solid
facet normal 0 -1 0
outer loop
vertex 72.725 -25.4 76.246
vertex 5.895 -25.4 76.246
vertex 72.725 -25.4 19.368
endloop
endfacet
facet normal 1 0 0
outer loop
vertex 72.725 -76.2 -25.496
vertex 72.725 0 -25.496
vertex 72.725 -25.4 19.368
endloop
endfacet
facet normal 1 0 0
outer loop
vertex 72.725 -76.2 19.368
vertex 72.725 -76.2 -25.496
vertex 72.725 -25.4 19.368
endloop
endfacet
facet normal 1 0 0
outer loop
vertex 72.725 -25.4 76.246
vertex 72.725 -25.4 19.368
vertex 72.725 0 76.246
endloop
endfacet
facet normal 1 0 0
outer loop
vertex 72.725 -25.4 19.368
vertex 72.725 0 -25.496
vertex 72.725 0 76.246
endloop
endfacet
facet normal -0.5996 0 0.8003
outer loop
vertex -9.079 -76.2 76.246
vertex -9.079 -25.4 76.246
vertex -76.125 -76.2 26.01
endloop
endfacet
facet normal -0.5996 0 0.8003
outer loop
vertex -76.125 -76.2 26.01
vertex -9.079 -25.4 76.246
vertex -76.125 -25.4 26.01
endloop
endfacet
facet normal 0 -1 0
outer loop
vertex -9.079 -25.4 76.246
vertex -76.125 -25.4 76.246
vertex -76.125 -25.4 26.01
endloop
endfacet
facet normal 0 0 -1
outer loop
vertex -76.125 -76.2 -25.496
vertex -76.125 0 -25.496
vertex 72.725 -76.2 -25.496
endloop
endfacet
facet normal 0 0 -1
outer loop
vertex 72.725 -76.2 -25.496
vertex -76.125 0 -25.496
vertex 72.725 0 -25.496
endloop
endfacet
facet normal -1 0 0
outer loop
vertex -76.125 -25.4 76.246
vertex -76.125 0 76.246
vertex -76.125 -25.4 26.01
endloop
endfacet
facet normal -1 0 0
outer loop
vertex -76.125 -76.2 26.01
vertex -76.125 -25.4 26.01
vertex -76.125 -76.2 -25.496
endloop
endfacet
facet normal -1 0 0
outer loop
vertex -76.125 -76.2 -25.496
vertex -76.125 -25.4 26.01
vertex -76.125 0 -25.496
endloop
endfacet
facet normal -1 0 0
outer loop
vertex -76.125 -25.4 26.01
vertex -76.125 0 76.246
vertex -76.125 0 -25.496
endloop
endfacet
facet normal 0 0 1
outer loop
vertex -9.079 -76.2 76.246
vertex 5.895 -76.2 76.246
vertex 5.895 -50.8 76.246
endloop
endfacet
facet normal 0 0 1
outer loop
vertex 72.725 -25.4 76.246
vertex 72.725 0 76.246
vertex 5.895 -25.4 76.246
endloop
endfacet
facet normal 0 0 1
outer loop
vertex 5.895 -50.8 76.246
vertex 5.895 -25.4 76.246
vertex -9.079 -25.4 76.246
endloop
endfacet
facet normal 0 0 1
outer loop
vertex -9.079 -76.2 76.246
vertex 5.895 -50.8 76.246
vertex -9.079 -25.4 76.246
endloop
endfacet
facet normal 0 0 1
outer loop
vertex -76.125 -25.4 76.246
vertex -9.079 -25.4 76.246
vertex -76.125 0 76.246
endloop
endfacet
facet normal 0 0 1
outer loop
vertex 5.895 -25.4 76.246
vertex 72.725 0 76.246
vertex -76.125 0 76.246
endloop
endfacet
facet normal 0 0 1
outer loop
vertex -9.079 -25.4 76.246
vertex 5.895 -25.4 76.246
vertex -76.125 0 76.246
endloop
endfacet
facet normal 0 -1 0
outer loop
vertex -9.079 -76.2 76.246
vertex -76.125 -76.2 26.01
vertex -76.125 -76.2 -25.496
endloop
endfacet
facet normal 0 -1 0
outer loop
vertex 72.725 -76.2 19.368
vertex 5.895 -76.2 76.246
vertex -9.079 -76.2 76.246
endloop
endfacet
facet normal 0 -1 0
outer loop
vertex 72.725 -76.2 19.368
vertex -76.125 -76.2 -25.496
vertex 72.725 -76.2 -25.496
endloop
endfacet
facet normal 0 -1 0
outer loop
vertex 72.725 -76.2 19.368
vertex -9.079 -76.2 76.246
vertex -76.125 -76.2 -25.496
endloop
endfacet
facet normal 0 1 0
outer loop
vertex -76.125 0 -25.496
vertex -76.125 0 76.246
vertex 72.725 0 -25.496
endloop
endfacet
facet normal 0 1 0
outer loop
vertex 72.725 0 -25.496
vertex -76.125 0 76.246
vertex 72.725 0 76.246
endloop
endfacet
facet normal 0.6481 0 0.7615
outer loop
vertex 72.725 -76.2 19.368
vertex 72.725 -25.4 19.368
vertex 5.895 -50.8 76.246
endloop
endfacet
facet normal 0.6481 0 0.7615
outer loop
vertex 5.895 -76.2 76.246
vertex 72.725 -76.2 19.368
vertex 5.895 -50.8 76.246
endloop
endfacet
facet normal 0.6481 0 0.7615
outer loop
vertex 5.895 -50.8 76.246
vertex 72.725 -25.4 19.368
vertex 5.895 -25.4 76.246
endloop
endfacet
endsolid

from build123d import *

# Parameters (mm, degrees)
F0_W     = 148.8501727581
F0_H     = 101.742612198
F1_DEPTH = 50.8
F3_DEPTH = 25.4
F5_DEPTH = 25.4


with BuildPart() as f1:
    # F0 (on Front) → F1 (new body)
    with BuildSketch(Plane.XZ):
        with Locations((-1.6997531056, 25.3749480471)):
            Rectangle(F0_W, F0_H)
    extrude(amount=F1_DEPTH)

    # F2 (on face) → F3 (cut)
    with BuildSketch(Plane.XZ.offset(50.8)):
        Polygon((-9.0788973585, 76.2462541461), (-76.1248394847, 76.2462541461), (-76.1248394847, 26.0104050889), align=None)
        Polygon((72.7253332734, 76.2462541461), (5.8954056378, 76.2462541461), (72.7253332734, 19.3677039224), align=None)
    extrude(amount=-F3_DEPTH, mode=Mode.SUBTRACT)

    # F1_face (on face) + F4 (on face) → F5 (join)
    with BuildSketch(Plane(origin=(-1.6997531056, -50.8, 25.3749480471), x_dir=(1, 0, 0), z_dir=(0, -1, 0))):
        Polygon((74.4250863791, -6.0072441247), (7.5951587435, 50.871306099), (-7.3791442529, 50.871306099), (-74.4250863791, 0.6354570418), (-74.4250863791, -50.871306099), (74.4250863791, -50.871306099), align=None)
    with BuildSketch(Plane.XZ.offset(50.8)):
        Polygon((72.7253332734, -25.4963580519), (72.7253332734, 19.3677039224), (5.8954056378, 76.2462541461), (-9.0788973585, 76.2462541461), (-76.1248394847, 26.0104050889), (-76.1248394847, -25.4963580519), align=None)
    extrude(amount=F5_DEPTH)


solid = f1.part
